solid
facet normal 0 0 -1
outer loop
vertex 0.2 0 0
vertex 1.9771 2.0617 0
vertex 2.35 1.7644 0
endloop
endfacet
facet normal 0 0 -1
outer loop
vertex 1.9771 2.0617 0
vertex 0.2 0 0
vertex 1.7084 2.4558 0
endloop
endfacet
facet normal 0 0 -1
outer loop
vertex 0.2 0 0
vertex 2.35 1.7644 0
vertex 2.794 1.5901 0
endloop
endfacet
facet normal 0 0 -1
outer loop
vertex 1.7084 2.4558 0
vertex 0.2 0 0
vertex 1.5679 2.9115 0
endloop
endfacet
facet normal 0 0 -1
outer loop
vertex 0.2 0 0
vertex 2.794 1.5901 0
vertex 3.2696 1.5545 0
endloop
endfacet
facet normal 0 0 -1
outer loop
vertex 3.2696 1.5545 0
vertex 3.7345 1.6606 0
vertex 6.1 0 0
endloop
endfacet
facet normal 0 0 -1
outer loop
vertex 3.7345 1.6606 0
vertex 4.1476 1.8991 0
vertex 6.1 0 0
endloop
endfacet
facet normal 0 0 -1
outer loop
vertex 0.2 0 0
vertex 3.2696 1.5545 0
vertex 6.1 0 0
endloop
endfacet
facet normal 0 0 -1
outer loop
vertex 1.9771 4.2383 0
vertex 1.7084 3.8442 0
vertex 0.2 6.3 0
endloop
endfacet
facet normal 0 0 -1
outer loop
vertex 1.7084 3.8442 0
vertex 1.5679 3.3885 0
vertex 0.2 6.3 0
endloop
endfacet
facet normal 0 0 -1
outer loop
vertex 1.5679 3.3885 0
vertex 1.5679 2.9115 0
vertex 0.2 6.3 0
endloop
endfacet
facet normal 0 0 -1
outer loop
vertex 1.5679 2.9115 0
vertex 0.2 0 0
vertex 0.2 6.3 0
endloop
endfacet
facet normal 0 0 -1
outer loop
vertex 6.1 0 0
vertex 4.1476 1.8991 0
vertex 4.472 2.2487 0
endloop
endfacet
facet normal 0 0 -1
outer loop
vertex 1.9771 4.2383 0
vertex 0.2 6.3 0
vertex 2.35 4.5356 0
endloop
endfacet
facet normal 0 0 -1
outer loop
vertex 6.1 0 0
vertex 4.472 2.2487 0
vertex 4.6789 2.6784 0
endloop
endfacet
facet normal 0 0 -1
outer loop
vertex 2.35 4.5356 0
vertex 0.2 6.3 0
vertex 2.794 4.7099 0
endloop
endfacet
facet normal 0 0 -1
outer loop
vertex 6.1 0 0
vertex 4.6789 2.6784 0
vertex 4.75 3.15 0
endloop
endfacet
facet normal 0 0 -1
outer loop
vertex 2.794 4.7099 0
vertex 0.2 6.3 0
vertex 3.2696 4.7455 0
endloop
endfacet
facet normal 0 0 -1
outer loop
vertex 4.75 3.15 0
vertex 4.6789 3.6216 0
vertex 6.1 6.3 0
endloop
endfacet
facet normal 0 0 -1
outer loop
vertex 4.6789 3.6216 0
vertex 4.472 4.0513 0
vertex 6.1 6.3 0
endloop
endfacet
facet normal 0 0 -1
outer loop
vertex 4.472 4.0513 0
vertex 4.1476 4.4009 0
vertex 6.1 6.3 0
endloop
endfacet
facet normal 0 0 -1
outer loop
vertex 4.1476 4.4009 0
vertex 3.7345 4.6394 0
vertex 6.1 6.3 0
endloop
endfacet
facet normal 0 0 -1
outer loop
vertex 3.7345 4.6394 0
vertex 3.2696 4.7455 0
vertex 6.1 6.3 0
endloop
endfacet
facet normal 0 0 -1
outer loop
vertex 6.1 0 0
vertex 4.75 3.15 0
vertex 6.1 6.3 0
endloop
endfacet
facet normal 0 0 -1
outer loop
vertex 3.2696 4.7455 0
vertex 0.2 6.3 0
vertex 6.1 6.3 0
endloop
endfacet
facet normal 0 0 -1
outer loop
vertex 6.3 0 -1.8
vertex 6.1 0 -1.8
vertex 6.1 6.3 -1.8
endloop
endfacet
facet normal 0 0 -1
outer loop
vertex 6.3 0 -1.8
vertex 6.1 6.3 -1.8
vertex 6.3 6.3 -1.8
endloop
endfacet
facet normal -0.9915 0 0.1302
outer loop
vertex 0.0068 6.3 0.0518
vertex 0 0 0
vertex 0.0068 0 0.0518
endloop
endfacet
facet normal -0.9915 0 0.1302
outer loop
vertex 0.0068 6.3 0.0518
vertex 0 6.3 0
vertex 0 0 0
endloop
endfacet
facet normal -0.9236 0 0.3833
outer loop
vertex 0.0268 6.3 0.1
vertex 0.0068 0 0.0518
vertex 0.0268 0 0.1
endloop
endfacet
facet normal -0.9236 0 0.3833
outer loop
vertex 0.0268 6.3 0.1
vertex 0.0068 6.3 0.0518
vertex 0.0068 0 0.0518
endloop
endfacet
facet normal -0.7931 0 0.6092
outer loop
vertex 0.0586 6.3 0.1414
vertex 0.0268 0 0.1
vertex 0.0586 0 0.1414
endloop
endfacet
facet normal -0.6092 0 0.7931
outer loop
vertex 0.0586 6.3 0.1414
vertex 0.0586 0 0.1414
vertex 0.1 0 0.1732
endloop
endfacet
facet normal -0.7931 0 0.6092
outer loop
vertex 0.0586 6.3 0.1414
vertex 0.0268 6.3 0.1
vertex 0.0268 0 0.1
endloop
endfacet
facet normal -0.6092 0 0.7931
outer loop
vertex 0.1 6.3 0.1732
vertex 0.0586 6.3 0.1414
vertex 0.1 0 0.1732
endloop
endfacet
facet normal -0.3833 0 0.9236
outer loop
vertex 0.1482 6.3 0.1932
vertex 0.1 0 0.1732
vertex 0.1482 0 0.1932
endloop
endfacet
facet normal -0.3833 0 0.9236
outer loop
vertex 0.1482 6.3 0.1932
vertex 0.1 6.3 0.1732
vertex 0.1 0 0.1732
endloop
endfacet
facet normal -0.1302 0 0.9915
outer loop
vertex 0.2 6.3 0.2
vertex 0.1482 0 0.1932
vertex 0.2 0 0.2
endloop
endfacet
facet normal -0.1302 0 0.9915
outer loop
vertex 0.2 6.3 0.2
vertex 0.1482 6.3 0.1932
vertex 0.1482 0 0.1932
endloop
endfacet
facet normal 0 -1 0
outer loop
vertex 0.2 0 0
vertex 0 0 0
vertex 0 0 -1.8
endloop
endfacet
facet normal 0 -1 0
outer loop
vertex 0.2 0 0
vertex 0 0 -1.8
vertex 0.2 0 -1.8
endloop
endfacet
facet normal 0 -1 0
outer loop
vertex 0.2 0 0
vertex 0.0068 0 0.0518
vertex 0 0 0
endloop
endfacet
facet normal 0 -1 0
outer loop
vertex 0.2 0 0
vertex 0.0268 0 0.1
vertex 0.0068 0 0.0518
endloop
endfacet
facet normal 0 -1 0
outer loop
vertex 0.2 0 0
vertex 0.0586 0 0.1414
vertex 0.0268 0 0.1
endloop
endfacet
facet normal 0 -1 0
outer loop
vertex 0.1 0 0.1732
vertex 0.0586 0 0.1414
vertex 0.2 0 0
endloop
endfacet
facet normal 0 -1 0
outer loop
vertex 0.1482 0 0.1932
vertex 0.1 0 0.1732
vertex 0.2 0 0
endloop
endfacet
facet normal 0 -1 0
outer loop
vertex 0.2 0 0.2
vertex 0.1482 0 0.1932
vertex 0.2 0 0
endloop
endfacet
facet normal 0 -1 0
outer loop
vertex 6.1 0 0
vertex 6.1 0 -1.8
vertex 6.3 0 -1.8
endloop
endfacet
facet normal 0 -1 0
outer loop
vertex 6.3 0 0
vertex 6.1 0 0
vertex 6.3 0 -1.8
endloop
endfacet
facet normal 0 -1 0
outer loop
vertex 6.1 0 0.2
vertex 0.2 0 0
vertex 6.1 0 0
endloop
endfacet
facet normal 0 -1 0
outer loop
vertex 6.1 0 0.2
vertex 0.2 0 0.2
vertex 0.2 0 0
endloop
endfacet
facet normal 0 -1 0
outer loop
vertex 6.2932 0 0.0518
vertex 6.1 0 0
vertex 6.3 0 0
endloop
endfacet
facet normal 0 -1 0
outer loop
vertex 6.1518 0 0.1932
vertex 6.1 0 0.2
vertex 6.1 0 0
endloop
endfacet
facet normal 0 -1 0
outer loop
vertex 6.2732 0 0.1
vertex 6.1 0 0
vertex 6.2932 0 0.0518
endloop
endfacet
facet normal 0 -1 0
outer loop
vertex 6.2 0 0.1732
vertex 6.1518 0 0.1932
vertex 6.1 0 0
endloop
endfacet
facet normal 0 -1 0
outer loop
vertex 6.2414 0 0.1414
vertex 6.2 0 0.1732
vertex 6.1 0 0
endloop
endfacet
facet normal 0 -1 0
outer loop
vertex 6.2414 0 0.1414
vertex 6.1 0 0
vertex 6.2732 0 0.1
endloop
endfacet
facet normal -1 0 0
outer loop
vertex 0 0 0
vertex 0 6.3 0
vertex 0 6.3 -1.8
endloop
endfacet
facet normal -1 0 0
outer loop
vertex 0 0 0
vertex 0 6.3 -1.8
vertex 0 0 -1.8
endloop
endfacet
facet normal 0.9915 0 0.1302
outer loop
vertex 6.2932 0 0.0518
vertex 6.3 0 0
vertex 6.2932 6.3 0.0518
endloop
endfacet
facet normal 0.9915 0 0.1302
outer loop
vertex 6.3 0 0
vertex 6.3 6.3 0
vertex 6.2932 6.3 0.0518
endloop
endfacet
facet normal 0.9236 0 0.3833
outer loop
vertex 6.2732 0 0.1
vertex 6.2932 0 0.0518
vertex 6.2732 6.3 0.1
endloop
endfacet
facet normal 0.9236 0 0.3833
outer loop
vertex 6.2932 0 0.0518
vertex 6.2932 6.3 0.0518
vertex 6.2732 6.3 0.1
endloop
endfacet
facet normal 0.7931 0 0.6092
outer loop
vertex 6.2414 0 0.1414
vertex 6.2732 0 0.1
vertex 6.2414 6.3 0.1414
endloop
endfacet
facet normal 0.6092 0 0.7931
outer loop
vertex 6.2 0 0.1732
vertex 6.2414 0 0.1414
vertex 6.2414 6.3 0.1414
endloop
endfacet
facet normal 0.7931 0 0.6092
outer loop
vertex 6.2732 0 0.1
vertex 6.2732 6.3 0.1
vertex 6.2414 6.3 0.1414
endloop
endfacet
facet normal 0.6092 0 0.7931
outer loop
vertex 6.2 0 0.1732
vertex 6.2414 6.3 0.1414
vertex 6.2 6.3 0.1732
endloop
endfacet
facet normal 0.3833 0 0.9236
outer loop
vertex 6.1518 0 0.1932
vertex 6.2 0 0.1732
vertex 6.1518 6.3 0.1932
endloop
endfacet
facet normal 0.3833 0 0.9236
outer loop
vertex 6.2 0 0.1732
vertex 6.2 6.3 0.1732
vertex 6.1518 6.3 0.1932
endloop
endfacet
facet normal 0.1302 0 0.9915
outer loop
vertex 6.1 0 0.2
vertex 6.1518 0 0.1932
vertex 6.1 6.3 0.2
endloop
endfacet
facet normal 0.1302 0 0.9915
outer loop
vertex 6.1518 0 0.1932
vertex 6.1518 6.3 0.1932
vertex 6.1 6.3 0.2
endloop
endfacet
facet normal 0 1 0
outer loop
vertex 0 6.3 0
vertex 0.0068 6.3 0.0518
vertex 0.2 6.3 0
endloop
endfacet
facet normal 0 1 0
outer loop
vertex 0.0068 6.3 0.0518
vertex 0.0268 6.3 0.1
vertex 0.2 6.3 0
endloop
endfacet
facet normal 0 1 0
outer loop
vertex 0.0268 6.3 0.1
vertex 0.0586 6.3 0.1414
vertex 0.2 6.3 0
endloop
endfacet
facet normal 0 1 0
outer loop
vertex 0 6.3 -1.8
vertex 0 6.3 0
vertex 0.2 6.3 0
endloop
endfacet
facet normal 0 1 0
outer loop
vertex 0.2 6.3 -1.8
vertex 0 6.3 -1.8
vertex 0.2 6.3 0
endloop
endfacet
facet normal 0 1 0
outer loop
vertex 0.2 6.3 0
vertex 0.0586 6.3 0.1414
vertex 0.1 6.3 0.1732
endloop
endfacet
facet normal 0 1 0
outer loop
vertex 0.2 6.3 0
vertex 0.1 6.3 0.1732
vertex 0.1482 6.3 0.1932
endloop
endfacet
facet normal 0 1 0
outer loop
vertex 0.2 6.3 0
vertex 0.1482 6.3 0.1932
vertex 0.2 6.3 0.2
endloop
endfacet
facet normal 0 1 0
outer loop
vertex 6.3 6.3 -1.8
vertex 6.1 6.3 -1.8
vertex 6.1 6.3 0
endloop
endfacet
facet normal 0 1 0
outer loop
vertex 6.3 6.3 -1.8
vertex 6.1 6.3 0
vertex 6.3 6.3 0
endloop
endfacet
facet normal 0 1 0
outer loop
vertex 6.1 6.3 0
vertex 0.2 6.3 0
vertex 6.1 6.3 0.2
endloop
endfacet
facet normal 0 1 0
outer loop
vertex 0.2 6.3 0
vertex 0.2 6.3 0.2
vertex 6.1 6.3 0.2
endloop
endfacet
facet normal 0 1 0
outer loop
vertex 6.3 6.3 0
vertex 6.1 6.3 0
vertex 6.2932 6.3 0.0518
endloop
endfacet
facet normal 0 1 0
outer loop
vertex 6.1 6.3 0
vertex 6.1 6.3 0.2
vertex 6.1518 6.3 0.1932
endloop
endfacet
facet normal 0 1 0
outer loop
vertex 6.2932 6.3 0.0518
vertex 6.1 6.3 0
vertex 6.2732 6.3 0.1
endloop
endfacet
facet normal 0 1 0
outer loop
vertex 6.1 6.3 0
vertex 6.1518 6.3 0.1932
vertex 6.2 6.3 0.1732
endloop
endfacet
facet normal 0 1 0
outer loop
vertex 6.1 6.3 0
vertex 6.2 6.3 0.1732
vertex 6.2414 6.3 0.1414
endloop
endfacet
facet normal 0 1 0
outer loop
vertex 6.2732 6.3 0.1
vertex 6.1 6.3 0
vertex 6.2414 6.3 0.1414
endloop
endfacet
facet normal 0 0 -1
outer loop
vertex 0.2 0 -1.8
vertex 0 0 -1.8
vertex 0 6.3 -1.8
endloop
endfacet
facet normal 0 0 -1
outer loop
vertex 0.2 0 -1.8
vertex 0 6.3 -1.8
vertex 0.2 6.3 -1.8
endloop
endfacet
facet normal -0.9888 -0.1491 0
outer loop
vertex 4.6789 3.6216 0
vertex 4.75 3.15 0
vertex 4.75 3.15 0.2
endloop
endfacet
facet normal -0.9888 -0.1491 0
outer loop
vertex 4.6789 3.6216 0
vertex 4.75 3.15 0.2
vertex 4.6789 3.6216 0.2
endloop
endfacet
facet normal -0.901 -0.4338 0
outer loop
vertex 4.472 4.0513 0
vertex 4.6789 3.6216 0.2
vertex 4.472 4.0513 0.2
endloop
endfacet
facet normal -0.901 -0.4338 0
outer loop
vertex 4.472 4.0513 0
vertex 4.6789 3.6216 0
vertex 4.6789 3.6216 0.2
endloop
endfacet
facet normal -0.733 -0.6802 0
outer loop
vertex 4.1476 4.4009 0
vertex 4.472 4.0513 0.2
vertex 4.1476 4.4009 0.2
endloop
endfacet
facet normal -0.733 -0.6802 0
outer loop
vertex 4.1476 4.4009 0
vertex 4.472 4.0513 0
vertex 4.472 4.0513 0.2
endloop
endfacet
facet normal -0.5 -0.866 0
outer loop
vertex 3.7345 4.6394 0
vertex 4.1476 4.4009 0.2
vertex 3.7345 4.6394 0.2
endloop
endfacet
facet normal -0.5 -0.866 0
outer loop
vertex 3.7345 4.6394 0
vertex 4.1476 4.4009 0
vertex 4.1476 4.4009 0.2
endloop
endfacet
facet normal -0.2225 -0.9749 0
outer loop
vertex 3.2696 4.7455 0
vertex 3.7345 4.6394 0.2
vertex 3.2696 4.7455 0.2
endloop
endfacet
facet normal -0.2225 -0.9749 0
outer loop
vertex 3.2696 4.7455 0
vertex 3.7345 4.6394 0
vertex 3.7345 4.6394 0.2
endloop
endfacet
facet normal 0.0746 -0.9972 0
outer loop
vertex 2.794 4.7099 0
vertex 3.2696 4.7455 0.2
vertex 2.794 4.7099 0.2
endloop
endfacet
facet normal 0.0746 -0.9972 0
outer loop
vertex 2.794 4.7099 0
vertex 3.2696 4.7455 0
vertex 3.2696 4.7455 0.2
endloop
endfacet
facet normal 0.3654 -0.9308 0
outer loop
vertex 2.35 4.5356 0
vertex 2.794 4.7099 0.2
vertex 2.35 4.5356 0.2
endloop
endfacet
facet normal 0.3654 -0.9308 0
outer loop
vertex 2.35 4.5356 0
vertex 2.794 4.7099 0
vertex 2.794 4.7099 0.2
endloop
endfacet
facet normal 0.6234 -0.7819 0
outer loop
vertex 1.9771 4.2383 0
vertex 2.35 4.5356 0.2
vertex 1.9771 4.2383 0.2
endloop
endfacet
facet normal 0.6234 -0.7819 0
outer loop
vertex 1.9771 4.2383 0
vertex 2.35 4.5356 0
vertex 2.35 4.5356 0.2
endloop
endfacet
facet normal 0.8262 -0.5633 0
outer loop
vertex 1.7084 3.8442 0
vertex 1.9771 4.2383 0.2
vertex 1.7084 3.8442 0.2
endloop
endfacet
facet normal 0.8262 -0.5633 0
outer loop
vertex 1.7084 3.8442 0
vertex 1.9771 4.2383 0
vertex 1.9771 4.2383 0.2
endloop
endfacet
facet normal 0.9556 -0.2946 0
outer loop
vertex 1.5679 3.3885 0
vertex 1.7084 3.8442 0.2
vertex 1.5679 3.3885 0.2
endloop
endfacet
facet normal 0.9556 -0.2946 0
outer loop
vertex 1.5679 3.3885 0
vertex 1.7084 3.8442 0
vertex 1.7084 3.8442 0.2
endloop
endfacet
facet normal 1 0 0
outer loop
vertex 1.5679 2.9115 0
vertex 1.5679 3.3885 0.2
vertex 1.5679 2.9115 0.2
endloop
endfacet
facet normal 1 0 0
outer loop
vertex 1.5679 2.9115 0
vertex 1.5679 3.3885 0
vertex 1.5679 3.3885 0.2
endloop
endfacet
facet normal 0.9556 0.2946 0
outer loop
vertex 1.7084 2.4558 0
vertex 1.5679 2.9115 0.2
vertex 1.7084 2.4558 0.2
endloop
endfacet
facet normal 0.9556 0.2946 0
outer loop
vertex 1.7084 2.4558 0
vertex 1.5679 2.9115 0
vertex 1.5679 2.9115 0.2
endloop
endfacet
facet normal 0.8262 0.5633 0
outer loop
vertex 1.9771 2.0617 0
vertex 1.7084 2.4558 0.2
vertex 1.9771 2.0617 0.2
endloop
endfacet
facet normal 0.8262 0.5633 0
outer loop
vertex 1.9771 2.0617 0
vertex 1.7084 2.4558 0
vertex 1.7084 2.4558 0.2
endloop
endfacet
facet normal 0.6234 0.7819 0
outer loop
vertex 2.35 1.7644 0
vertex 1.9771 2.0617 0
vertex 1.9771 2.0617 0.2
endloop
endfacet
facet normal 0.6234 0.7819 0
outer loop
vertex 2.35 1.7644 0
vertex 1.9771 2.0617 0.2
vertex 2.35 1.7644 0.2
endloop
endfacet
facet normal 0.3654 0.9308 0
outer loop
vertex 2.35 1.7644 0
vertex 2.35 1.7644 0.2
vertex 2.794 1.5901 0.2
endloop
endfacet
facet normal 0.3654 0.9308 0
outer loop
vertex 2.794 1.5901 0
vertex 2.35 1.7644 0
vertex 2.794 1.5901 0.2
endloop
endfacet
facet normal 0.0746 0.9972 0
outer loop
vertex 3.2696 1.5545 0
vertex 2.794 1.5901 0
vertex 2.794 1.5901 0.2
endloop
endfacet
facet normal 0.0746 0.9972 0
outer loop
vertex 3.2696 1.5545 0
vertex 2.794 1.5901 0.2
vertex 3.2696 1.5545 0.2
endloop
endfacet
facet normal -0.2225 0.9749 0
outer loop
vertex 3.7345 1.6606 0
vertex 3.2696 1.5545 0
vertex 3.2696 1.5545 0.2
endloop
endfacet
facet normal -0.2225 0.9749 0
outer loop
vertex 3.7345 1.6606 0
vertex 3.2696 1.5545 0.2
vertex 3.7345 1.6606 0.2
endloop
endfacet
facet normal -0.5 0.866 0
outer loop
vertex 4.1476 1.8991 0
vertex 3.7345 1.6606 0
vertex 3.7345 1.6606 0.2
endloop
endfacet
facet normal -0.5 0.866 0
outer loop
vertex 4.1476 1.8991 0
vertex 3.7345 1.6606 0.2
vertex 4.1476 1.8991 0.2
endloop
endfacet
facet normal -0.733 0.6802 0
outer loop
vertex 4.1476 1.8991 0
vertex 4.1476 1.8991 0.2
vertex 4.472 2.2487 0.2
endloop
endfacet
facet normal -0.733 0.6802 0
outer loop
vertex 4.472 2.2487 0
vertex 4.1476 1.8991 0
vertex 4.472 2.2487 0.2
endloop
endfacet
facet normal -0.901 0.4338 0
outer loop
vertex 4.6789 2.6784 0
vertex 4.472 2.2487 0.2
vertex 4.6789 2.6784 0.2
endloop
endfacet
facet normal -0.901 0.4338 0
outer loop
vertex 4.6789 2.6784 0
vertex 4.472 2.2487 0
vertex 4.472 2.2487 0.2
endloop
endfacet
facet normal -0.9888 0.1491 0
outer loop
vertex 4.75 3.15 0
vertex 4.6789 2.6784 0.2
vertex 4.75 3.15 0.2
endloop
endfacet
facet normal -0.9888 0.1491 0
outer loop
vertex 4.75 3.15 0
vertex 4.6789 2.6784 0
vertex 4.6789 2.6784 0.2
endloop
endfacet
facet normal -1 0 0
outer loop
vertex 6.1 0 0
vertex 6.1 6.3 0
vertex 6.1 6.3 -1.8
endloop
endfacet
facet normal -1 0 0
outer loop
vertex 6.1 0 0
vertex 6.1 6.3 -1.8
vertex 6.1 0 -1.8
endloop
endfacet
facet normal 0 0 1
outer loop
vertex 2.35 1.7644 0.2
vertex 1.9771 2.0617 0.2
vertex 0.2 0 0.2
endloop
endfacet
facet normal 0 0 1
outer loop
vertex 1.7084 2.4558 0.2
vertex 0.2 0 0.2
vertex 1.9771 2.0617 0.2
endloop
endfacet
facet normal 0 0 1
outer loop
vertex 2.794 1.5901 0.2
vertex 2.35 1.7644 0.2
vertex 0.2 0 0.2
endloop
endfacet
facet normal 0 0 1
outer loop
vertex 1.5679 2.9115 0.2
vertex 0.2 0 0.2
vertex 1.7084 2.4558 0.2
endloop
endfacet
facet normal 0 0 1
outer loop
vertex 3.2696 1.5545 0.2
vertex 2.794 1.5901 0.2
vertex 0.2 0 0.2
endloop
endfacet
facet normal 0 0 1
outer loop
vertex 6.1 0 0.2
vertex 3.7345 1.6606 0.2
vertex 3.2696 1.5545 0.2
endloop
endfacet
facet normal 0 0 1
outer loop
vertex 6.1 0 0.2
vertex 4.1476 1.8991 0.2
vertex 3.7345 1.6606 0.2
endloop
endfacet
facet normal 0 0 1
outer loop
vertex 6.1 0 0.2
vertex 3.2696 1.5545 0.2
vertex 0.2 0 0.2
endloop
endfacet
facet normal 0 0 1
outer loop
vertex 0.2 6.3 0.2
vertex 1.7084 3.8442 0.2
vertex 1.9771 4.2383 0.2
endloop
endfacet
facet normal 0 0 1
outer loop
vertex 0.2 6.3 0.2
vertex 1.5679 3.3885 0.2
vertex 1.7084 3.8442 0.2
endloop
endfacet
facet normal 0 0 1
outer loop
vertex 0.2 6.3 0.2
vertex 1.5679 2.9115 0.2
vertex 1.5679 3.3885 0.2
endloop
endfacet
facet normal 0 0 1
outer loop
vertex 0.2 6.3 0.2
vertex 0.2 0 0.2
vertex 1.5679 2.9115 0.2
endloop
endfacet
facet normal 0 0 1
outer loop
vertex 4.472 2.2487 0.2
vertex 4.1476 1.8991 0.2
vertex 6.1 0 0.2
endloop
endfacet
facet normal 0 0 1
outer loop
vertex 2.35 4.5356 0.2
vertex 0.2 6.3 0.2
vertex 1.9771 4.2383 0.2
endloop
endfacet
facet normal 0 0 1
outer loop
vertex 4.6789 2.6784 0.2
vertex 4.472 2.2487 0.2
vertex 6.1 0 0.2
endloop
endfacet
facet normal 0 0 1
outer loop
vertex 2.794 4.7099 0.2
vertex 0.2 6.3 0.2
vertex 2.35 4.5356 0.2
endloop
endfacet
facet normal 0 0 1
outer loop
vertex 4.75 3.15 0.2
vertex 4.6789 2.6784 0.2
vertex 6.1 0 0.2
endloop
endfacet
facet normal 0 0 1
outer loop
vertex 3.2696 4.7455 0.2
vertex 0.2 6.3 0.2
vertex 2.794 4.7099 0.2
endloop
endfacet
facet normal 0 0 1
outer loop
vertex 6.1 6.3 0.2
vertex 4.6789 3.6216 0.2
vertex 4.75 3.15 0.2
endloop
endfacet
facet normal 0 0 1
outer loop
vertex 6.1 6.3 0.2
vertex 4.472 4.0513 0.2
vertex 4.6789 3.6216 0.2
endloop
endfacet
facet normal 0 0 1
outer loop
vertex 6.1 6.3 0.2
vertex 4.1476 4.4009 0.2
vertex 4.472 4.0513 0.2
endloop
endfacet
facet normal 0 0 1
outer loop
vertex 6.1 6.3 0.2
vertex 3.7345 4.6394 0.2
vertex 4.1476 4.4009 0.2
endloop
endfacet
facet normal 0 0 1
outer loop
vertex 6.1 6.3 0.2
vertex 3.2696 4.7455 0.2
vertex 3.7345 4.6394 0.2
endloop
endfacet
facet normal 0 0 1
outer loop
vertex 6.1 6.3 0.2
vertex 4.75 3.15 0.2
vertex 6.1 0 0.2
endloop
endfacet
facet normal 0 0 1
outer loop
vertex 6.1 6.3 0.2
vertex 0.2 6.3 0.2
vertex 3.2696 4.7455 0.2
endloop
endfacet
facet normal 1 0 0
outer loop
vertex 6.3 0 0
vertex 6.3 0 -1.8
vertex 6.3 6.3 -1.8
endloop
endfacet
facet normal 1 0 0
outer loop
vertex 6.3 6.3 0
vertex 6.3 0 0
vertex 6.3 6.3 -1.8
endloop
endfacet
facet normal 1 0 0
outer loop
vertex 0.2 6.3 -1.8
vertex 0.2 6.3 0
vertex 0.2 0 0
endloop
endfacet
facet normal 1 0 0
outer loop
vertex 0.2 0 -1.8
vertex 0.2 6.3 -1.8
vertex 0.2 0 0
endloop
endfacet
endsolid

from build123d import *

# Parameters (mm, degrees)
F0_W     = 6.3
F0_H     = 6.3
F0_R     = 1.6
F1_DEPTH = 0.2
F2_W     = 0.2
F2_H     = 6.3
F3_DEPTH = 1.8
F4_R     = 0.2


with BuildPart() as f1:
    # F0 (on Top) → F1 (new body)
    with BuildSketch(Plane.XY):
        with Locations((3.15, 3.15)):
            Rectangle(F0_W, F0_H)
        with Locations((3.15, 3.15)):
            Circle(F0_R, mode=Mode.SUBTRACT)
    extrude(amount=F1_DEPTH)

    # F2 (on face) → F3 (join)
    with BuildSketch(Plane(origin=(0, 0, 0), x_dir=(1, 0, 0), z_dir=(0, 0, -1))):
        with Locations((0.1, -3.15)):
            Rectangle(F2_W, F2_H)
        with Locations((6.2, -3.15)):
            Rectangle(F2_W, F2_H)
    extrude(amount=F3_DEPTH)

    # F4
    f4_edges = [f1.edges().sort_by_distance(p)[0] for p in [
        (0, 3.15, 0.2),
        (6.3, 3.15, 0.2),
    ]]
    fillet(f4_edges, radius=F4_R)


solid = f1.part
